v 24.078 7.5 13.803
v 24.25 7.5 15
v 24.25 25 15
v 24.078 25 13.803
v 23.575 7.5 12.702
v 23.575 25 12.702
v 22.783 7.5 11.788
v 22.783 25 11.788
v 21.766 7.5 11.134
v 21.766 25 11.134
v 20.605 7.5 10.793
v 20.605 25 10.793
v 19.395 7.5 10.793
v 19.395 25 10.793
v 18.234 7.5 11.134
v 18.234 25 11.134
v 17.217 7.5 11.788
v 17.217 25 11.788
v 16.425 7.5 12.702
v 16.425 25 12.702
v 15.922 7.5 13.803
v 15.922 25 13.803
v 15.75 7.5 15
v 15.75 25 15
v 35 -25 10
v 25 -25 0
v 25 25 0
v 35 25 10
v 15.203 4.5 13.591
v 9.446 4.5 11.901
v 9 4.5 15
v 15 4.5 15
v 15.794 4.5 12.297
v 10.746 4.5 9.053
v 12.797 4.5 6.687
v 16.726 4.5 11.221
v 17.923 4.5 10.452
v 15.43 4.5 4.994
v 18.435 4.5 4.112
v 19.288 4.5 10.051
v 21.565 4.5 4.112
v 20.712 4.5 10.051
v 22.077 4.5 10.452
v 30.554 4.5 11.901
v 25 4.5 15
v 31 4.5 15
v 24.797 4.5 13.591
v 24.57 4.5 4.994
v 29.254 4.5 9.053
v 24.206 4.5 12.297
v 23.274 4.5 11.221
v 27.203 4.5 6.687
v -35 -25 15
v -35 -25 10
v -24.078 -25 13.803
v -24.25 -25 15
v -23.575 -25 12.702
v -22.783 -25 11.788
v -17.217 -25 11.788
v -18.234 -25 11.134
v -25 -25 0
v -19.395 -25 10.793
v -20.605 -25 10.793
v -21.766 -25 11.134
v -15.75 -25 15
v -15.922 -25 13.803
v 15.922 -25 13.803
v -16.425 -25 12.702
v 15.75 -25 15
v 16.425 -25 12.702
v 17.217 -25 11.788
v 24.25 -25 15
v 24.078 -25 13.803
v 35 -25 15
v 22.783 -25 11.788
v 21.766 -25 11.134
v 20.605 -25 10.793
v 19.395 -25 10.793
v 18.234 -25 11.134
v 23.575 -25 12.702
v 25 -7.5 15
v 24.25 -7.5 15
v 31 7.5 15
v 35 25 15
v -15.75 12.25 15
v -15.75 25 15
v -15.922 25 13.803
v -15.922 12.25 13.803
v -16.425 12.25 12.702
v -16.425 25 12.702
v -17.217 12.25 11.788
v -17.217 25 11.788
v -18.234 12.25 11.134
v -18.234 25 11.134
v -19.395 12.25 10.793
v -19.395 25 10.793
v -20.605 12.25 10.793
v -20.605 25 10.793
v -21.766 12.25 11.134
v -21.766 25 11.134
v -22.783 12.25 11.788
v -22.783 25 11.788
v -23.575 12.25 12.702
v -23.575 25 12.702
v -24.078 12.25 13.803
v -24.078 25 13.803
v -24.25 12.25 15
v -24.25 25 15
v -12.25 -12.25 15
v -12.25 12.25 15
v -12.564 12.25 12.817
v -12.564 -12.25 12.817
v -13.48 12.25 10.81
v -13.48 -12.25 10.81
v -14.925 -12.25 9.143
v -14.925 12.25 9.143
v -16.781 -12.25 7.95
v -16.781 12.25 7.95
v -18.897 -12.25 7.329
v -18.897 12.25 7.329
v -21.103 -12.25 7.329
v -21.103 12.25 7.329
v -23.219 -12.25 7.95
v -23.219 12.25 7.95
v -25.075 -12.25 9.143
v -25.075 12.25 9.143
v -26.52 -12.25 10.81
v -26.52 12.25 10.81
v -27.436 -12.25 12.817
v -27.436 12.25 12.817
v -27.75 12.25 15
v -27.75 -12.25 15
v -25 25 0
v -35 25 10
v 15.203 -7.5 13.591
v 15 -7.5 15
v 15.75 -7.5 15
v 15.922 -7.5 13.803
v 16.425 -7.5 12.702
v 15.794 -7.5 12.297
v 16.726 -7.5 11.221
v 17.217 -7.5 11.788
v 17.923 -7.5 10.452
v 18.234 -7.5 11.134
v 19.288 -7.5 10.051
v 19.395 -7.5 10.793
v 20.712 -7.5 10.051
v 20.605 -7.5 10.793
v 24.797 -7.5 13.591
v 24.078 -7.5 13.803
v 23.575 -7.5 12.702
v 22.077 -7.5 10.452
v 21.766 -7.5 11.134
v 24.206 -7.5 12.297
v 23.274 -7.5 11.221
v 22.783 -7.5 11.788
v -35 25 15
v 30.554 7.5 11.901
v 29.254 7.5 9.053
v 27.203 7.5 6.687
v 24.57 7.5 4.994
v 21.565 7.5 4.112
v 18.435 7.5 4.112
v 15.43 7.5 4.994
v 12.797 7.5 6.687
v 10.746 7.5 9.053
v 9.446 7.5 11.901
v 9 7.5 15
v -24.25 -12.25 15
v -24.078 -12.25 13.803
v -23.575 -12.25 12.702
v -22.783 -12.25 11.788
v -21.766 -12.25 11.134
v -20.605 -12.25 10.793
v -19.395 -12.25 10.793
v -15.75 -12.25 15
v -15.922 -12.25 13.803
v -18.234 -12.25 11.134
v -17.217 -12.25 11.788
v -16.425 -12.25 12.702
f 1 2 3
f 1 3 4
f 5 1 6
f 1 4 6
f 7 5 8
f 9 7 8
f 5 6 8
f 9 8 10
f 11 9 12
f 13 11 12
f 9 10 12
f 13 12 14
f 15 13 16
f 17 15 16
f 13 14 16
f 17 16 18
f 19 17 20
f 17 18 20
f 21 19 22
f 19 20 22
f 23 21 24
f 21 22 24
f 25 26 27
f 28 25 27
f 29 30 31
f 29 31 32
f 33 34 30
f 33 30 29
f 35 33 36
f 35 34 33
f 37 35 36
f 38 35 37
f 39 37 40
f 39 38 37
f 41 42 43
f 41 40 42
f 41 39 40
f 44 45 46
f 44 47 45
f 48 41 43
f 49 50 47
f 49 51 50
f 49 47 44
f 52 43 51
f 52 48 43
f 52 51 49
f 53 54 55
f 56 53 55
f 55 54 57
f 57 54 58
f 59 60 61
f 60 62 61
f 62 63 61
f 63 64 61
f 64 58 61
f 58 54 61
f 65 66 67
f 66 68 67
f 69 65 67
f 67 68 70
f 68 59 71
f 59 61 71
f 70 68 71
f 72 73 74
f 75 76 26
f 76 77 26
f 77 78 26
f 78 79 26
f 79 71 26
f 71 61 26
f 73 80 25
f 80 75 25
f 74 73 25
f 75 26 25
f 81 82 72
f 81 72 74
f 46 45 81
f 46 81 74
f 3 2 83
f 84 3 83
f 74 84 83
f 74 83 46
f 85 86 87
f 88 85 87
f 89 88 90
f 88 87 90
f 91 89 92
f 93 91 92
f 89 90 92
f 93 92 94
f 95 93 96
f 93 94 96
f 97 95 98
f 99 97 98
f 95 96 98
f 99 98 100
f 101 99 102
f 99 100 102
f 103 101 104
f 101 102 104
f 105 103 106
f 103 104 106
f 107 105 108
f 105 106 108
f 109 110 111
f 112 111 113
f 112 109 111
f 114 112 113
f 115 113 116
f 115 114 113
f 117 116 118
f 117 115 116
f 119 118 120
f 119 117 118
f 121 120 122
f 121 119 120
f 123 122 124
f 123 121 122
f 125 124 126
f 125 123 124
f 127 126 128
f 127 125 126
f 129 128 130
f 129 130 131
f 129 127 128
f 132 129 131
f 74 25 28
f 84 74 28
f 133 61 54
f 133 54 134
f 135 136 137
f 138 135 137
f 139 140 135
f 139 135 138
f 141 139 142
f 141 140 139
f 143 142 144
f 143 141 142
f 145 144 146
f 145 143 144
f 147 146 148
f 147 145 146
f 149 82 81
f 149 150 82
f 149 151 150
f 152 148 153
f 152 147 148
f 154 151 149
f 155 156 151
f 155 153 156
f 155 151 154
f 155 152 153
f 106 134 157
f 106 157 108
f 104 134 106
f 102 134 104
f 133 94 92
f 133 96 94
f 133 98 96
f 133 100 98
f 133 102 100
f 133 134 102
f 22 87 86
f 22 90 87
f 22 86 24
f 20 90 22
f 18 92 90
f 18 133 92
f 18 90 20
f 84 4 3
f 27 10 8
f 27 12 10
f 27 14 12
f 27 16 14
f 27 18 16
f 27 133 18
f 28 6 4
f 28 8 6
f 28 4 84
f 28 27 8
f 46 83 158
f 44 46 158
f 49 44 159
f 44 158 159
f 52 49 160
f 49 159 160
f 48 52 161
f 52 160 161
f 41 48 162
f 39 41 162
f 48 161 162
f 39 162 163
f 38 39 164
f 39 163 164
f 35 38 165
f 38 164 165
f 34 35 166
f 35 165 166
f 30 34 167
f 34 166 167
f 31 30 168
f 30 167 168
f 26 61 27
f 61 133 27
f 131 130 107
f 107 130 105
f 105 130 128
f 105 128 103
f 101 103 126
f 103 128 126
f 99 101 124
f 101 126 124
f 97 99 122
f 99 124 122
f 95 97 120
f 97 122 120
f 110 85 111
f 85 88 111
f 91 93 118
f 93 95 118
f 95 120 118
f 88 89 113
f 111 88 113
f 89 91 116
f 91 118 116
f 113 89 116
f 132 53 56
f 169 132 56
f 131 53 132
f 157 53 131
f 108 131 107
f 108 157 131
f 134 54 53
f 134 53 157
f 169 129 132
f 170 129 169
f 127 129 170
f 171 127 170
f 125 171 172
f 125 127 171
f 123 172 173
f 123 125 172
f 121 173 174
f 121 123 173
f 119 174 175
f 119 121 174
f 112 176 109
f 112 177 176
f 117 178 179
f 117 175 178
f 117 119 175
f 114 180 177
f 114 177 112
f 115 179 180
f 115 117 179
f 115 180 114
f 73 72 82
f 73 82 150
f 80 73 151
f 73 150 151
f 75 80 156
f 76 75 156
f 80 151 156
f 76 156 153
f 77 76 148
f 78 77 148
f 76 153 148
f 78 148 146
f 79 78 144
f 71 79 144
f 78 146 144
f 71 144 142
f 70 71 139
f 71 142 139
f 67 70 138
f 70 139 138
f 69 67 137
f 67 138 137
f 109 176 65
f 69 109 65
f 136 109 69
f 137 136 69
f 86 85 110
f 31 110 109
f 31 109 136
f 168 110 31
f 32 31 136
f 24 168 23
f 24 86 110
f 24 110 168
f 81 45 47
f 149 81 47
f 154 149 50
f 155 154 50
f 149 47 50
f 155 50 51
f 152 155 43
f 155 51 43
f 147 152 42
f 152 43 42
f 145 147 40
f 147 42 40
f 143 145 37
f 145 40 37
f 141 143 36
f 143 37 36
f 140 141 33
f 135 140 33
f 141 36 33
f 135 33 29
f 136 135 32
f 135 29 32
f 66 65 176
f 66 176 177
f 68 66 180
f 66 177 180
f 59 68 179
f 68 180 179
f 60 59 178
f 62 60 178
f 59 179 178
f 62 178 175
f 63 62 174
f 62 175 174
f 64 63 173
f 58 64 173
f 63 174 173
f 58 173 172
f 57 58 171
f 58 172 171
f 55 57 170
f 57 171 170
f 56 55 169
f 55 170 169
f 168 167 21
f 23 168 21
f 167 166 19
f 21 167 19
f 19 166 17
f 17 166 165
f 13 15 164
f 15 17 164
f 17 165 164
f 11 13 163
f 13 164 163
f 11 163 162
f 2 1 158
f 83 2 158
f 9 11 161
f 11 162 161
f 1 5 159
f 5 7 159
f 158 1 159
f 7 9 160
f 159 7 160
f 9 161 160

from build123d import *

# Parameters (mm, degrees)
ESQUISSE1_W                  = 70
ESQUISSE1_H                  = 50
BOSS_EXTRU_1_DEPTH           = 15
ESQUISSE2_R                  = 4.25
ENL_V_MAT_EXTRU_1_DEPTH      = 63.84902545
ENL_V_MAT_EXTRU_2_DEPTH      = 12.25
ENL_V_MAT_EXTRU_2_DEPTH_BACK = 12.25
ESQUISSE3_R                  = 7.75
ESQUISSE4_R                  = 11
ENL_V_MAT_EXTRU_3_DEPTH      = 3
ESQUISSE5_R                  = 5
ENL_V_MAT_EXTRU_4_DEPTH      = 15
CHANFREIN1_SIZE              = 10


with BuildPart() as part:
    # Esquisse1 → Boss.-Extru.1 (new body)
    with BuildSketch(Plane.XY):
        Rectangle(ESQUISSE1_W, ESQUISSE1_H)
    extrude(amount=BOSS_EXTRU_1_DEPTH)

    # Esquisse2 → Enlèv. mat.-Extru.1 (cut, through all)
    with BuildSketch(Plane(origin=(0, 25, 0), x_dir=(1, 0, 0), z_dir=(0, 1, 0))):
        with Locations((-20, -15)):
            Circle(ESQUISSE2_R)
        with Locations((20, -15)):
            Circle(ESQUISSE2_R)
    extrude(amount=-ENL_V_MAT_EXTRU_1_DEPTH, mode=Mode.SUBTRACT)

    # Esquisse3 → Enlèv. mat.-Extru.2 (cut, two sides: drawn at the far end of the back side and taken through both)
    with BuildSketch(Plane(origin=(0, 0, 0), x_dir=(1, 0, 0), z_dir=(0, 1, 0)).offset(-ENL_V_MAT_EXTRU_2_DEPTH_BACK)):
        with Locations((-20, -15)):
            Circle(ESQUISSE3_R)
    extrude(amount=ENL_V_MAT_EXTRU_2_DEPTH + ENL_V_MAT_EXTRU_2_DEPTH_BACK, mode=Mode.SUBTRACT)

    # Esquisse4 → Enlèv. mat.-Extru.3 (cut)
    with BuildSketch(Plane(origin=(0, 7.5, 0), x_dir=(1, 0, 0), z_dir=(0, 1, 0))):
        with Locations((20, -15)):
            Circle(ESQUISSE4_R)
    extrude(amount=-ENL_V_MAT_EXTRU_3_DEPTH, mode=Mode.SUBTRACT)

    # Esquisse5 → Enlèv. mat.-Extru.4 (cut)
    with BuildSketch(Plane(origin=(0, 7.5, 0), x_dir=(1, 0, 0), z_dir=(0, 1, 0))):
        with Locations((20, -15)):
            Circle(ESQUISSE5_R)
    extrude(amount=-ENL_V_MAT_EXTRU_4_DEPTH, mode=Mode.SUBTRACT)

    # Chanfrein1
    chanfrein1_edges = [part.edges().sort_by_distance(p)[0] for p in [
        (-35, 0, 0),
        (35, 0, 0),
    ]]
    chamfer(chanfrein1_edges, length=CHANFREIN1_SIZE)


solid = part.part
